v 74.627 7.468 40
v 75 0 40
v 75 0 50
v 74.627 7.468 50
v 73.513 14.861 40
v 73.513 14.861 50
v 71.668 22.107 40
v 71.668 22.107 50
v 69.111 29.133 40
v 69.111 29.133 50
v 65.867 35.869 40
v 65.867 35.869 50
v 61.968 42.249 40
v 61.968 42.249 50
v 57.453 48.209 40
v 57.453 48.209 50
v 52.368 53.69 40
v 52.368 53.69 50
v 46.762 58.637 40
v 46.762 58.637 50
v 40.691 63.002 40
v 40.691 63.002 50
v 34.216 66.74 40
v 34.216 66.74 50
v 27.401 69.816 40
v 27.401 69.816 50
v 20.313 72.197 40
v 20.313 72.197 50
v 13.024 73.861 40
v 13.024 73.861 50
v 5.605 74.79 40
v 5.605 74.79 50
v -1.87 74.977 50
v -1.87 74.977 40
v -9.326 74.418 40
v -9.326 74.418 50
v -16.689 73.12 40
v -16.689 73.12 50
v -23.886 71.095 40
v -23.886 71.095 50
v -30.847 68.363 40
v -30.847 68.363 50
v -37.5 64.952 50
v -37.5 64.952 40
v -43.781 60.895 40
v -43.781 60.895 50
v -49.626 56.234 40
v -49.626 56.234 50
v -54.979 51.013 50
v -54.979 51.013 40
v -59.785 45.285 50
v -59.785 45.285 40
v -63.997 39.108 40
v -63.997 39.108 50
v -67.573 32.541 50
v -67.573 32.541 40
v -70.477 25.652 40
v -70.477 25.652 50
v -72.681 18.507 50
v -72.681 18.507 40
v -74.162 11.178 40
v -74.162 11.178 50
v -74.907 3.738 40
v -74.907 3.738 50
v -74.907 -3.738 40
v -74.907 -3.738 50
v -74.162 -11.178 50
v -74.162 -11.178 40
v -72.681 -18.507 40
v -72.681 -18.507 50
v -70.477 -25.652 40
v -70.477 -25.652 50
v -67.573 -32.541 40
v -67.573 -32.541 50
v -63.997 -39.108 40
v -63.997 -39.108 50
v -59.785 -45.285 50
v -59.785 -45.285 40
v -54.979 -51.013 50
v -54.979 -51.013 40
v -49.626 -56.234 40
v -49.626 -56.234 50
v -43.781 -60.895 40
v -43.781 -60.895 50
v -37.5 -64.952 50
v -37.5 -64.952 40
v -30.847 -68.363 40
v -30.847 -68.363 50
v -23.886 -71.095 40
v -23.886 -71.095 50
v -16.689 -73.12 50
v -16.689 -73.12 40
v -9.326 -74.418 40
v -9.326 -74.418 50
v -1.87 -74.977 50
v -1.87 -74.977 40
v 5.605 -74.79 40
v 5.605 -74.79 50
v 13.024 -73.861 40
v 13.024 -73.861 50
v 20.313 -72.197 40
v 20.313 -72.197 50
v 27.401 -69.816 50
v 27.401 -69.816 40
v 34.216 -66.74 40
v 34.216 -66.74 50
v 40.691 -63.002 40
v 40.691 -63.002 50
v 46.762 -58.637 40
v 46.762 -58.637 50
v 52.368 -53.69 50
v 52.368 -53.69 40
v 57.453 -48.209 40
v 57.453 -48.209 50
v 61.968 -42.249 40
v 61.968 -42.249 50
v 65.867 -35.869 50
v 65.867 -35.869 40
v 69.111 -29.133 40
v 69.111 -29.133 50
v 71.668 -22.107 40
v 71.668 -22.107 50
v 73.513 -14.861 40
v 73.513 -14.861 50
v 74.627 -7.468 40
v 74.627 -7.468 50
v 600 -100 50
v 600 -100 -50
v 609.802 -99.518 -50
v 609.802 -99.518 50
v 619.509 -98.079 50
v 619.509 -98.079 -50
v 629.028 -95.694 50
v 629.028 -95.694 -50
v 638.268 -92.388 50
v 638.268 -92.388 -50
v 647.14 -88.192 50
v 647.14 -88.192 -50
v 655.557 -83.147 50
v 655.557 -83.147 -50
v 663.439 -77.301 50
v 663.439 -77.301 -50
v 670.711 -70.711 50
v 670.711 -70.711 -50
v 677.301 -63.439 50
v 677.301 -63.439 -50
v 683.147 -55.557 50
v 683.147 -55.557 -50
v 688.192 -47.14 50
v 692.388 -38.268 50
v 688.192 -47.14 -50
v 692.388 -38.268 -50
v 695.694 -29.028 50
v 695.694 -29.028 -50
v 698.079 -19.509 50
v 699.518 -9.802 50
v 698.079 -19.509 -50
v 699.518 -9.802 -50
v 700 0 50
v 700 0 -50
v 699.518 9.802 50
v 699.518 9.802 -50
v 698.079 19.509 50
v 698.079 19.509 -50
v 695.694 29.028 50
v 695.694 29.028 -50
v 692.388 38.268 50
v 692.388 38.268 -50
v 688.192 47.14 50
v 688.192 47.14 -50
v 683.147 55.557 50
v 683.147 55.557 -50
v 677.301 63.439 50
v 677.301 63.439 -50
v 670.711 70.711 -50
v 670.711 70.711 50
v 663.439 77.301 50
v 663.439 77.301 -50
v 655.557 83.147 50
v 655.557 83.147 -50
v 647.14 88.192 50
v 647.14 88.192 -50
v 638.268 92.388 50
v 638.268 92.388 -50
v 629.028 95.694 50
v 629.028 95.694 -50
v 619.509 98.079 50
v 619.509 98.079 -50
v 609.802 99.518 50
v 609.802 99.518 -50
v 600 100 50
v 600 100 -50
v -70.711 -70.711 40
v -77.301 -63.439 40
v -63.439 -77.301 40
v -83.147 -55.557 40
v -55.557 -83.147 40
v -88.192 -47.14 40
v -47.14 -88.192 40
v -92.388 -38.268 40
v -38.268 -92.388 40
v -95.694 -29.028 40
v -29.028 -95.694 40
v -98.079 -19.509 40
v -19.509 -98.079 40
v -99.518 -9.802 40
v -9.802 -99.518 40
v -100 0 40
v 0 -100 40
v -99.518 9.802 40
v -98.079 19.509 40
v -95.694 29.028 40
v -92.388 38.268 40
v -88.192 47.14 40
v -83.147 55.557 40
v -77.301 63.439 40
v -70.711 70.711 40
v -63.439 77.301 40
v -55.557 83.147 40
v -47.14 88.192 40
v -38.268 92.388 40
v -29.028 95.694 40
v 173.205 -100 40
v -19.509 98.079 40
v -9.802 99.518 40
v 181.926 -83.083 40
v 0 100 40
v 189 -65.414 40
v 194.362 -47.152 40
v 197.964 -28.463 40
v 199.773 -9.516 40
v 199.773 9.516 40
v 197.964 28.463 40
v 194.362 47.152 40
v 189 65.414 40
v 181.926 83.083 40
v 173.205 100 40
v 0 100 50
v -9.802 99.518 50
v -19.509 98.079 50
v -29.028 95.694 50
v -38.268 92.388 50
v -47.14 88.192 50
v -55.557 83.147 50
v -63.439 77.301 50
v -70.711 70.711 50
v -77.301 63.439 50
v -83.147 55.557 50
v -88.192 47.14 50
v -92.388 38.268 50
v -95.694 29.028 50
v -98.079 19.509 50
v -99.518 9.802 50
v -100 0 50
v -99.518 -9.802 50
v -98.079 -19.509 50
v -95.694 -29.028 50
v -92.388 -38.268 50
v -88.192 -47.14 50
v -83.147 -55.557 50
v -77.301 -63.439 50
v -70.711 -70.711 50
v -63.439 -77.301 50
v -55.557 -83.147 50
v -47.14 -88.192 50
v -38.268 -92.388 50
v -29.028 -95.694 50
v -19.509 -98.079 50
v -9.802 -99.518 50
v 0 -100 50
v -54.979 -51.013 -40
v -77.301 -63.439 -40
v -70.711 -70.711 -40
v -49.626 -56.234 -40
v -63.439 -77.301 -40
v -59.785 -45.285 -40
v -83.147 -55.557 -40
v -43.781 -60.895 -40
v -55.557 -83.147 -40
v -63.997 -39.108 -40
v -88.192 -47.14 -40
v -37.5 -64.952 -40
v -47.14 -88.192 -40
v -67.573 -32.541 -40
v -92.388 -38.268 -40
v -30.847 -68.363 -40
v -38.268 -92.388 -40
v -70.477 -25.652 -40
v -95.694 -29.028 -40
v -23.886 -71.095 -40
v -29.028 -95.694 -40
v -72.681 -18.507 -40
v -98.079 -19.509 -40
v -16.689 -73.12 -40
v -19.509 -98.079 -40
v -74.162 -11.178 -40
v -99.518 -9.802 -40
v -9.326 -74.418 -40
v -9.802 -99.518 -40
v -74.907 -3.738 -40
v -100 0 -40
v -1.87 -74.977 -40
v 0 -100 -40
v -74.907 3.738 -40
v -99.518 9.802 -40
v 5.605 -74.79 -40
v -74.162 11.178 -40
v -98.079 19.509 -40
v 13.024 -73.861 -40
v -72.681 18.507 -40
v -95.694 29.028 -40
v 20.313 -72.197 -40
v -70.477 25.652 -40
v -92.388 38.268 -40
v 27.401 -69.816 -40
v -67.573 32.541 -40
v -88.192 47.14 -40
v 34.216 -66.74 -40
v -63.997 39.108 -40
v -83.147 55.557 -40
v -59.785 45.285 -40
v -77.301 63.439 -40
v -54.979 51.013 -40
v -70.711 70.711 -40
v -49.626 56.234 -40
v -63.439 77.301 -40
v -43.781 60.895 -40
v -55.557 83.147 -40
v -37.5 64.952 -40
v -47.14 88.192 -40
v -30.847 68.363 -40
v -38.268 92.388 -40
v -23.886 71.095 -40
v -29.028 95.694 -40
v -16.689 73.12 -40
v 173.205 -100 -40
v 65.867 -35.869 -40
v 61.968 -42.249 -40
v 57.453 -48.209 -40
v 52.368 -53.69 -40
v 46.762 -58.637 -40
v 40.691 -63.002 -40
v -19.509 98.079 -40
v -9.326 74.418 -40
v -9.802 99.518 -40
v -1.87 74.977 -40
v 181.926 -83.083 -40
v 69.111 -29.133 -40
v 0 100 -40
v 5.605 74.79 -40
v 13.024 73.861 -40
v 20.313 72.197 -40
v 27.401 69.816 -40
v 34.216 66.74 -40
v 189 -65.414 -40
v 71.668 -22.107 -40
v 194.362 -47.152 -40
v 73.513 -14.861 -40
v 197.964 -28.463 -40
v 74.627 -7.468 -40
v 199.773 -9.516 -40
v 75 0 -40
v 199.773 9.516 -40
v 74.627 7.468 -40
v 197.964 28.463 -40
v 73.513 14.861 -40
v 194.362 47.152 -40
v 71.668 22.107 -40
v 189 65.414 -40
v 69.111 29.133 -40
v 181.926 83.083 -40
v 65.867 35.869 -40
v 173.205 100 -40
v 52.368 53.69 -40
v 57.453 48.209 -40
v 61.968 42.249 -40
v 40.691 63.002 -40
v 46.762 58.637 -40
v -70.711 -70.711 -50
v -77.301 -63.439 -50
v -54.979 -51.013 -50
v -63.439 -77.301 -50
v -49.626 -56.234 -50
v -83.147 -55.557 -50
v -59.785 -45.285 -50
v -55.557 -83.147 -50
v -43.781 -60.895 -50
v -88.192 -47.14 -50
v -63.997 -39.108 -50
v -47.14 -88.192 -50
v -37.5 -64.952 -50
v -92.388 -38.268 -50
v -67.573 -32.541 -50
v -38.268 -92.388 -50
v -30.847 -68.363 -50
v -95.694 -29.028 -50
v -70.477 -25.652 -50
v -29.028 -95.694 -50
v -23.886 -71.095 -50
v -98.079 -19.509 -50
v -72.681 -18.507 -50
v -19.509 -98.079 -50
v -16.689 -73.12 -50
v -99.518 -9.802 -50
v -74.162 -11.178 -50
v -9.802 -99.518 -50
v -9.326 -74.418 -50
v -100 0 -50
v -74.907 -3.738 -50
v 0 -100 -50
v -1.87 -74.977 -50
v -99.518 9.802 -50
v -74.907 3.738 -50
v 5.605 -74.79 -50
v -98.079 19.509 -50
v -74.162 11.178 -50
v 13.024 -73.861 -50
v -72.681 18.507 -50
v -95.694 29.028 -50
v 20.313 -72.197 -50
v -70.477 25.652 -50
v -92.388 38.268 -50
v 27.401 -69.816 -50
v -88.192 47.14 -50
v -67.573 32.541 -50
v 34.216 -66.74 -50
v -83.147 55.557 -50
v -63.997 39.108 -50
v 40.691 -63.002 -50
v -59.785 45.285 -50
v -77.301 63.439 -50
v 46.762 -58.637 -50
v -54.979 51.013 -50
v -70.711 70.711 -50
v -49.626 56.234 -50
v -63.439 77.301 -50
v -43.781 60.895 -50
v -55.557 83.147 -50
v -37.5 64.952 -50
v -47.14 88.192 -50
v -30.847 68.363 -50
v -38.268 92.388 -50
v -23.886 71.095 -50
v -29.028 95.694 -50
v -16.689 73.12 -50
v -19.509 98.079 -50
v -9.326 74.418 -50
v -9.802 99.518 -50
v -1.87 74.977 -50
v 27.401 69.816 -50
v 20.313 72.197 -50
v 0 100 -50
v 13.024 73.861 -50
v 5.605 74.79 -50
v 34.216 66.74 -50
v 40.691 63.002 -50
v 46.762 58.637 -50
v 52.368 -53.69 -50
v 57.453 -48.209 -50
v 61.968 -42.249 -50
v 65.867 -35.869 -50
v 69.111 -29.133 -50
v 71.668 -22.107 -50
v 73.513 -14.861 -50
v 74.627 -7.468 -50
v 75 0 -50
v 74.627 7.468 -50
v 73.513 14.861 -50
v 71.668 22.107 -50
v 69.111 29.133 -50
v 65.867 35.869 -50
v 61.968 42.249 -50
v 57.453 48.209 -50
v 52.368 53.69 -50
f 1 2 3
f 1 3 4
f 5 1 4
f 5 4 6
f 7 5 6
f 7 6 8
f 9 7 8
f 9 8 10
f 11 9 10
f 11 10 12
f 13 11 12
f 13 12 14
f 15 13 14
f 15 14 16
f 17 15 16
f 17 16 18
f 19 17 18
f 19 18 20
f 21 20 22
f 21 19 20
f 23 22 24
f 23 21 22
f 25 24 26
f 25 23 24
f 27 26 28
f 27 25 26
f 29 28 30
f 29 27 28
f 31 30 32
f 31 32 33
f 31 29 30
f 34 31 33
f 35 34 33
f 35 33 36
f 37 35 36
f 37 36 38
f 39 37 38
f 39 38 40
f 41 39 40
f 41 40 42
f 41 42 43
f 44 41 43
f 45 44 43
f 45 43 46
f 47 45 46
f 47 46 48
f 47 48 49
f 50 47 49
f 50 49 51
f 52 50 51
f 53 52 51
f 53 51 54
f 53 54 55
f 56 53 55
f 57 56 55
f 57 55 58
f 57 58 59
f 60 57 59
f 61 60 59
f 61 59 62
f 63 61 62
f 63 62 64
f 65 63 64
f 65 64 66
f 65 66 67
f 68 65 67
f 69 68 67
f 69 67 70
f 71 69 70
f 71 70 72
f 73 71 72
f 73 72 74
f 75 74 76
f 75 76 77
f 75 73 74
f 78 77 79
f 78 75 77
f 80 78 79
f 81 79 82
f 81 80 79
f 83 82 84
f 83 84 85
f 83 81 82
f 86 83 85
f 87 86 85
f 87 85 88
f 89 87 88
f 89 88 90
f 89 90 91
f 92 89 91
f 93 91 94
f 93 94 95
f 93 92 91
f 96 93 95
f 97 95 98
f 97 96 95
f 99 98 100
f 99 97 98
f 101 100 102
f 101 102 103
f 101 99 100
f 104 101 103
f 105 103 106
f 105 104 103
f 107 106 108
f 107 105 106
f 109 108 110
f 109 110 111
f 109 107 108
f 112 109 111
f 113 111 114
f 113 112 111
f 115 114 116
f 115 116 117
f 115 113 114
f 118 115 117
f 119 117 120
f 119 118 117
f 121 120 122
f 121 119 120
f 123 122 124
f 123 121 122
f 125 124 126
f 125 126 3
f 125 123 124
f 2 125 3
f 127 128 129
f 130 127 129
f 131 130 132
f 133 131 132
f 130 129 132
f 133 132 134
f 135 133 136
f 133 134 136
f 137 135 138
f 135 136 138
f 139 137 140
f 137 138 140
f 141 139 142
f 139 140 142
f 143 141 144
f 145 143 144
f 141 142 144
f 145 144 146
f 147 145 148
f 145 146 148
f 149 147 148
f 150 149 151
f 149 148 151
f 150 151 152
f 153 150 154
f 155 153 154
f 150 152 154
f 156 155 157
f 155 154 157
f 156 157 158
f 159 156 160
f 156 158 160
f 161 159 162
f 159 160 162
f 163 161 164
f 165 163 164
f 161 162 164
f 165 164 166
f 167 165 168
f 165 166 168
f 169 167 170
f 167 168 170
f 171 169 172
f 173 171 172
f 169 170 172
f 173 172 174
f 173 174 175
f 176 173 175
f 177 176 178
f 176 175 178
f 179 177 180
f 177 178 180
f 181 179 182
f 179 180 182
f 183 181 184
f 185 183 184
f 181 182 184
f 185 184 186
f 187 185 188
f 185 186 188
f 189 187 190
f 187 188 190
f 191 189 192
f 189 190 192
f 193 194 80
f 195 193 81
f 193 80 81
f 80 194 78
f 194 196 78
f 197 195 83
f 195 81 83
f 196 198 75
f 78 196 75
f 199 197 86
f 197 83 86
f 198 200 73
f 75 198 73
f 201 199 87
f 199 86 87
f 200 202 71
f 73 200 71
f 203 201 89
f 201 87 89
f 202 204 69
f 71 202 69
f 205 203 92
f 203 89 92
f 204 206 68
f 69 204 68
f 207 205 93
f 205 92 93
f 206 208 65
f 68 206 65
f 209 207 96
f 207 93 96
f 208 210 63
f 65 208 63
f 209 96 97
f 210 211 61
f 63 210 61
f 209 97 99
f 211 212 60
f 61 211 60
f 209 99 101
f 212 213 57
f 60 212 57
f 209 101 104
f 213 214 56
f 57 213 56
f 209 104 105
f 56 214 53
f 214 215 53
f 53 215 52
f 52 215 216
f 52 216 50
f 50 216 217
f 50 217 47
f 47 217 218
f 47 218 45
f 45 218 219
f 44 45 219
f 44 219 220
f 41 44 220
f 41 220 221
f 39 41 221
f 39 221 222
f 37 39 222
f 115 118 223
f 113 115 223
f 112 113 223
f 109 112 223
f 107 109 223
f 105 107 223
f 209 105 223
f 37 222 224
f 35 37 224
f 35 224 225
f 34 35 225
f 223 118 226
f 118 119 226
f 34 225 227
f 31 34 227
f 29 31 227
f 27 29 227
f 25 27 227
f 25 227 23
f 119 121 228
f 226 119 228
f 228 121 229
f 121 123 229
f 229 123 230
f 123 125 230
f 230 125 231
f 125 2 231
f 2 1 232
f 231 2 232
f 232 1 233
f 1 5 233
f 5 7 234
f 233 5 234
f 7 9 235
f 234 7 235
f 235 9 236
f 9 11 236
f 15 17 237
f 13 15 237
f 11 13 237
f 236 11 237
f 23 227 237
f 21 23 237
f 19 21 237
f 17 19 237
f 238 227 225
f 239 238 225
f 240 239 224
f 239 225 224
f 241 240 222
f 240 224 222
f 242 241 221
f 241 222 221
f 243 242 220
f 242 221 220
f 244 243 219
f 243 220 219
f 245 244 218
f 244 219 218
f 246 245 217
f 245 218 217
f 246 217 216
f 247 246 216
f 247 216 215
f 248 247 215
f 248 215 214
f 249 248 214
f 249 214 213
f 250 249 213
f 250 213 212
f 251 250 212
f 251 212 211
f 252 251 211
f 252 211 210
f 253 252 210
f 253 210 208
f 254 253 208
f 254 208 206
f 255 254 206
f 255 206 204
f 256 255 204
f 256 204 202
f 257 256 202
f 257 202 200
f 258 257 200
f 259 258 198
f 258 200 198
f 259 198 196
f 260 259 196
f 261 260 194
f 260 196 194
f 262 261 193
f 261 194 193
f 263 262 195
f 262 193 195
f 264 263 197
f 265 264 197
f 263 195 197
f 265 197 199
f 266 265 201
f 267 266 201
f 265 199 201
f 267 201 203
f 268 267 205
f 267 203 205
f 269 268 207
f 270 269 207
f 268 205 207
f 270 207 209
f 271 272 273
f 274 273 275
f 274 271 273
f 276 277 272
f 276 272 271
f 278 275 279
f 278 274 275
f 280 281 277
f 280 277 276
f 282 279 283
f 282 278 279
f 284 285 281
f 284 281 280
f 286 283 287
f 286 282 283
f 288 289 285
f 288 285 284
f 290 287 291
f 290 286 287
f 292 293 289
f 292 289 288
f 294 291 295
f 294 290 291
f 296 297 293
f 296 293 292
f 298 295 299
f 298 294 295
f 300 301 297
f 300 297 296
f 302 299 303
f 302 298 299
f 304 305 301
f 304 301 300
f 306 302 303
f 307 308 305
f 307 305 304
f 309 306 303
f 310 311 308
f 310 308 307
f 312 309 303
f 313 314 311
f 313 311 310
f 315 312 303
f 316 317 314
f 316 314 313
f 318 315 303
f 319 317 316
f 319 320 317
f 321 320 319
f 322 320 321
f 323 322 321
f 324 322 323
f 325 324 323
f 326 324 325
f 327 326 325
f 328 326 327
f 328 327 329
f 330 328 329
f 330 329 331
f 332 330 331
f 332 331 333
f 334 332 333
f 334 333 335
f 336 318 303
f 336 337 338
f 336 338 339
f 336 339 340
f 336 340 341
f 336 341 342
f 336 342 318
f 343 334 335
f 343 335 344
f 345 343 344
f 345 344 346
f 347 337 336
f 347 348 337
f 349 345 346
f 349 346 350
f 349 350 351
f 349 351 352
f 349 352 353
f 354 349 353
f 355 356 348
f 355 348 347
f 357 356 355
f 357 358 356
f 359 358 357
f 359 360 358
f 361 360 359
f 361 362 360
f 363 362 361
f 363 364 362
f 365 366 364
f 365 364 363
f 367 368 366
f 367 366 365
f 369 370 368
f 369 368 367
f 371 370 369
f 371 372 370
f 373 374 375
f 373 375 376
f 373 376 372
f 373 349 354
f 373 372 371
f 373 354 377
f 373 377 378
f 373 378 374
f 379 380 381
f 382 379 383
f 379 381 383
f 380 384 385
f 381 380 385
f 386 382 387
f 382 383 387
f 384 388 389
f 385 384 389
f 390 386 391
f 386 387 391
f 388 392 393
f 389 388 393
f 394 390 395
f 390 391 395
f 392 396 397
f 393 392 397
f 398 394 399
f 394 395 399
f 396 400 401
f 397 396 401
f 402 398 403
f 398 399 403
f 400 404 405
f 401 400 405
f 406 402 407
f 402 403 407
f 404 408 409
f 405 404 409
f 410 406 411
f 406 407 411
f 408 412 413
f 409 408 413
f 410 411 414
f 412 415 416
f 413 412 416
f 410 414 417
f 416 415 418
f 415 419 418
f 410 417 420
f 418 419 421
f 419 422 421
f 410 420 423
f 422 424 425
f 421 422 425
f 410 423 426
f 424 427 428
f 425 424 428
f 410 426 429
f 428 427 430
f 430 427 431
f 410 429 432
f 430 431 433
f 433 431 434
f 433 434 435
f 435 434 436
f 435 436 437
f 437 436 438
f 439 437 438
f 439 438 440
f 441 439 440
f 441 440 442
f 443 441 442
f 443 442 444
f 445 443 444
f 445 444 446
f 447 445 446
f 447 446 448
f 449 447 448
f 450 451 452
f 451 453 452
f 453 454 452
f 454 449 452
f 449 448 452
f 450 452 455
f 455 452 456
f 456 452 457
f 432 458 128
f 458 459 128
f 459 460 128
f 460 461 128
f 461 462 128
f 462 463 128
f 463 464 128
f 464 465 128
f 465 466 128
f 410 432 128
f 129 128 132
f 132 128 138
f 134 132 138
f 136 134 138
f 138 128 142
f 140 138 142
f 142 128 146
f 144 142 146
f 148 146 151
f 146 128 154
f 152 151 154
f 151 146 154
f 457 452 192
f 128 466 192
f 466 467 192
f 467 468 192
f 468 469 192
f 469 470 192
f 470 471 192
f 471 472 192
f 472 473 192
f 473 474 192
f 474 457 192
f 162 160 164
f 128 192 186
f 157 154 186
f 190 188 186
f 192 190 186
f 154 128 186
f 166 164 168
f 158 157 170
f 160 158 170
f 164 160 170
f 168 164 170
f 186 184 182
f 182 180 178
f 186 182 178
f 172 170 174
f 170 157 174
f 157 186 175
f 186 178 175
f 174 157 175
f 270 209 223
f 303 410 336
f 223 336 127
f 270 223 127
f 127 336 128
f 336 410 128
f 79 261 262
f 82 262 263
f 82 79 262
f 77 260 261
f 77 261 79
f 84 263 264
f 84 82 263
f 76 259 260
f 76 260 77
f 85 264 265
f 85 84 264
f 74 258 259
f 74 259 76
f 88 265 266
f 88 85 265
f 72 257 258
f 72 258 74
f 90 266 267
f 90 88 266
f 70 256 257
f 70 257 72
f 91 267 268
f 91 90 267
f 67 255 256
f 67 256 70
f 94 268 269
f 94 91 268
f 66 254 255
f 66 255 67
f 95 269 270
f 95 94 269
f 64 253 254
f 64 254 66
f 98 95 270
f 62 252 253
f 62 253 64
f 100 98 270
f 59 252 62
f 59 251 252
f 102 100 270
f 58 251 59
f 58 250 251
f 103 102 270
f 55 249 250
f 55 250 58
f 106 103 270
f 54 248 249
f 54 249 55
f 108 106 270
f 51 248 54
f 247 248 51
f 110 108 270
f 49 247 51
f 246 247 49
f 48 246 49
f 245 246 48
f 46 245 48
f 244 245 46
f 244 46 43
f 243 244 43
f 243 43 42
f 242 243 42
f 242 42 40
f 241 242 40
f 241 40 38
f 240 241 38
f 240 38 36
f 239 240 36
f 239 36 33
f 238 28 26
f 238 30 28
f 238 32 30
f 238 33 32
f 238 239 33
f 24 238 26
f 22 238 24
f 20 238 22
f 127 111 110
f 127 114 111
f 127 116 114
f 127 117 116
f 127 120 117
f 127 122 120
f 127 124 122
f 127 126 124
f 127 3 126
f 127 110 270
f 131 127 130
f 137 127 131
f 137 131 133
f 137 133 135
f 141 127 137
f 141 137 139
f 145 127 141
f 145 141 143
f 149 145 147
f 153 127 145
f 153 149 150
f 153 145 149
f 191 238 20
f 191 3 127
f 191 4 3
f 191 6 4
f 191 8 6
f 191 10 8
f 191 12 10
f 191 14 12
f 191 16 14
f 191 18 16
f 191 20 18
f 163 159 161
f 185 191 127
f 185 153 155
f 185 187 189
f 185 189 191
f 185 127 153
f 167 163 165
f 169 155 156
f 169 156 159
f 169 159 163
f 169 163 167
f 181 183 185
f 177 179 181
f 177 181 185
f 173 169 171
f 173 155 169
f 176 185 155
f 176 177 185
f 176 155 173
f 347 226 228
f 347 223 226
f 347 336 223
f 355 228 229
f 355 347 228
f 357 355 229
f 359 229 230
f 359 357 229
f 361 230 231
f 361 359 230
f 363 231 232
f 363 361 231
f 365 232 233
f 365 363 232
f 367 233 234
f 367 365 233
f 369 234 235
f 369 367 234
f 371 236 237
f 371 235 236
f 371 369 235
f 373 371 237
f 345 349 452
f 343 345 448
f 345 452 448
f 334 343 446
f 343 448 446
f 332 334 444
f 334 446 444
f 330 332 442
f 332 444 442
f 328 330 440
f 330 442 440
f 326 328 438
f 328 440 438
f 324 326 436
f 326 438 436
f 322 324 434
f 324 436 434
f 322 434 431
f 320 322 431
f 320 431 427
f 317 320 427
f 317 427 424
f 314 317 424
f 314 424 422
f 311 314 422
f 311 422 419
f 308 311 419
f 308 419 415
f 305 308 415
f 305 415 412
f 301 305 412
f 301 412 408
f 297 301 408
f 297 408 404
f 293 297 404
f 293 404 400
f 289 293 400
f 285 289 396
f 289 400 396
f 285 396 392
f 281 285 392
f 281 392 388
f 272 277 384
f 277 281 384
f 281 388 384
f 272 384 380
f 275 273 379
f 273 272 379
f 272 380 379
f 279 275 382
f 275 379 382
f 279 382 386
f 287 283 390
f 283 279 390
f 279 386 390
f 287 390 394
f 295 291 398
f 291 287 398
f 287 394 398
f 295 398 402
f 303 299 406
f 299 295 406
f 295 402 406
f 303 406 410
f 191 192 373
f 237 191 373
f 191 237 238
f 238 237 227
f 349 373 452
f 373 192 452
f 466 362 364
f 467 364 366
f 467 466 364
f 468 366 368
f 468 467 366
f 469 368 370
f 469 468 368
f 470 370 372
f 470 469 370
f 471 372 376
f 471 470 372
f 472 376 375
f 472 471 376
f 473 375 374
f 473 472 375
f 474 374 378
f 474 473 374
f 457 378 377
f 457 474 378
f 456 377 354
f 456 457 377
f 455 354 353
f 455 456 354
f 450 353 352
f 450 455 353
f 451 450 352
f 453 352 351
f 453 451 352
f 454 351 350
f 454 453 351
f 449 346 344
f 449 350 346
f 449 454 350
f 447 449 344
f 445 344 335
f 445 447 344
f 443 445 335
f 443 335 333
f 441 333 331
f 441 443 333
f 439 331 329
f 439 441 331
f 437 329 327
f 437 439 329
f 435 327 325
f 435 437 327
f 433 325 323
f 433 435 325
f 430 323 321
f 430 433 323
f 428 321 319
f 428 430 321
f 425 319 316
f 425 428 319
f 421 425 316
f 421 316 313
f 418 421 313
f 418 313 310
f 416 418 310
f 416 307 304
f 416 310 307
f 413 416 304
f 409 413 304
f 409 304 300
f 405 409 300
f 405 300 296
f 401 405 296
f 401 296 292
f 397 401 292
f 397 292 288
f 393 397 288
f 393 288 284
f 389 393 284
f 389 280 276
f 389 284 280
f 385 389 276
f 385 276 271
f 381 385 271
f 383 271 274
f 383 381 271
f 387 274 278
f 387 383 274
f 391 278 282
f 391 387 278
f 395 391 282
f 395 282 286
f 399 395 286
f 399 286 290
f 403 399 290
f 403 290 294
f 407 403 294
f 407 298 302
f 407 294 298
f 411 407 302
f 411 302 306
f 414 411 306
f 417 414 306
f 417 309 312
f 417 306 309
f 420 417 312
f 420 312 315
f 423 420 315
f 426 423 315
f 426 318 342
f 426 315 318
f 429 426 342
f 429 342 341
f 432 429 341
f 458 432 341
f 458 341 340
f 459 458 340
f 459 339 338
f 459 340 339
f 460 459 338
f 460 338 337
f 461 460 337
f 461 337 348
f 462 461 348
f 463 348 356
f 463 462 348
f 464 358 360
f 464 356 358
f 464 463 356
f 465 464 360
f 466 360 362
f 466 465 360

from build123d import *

# Parameters (mm, degrees)
BOSS_EXTRUDE1_DEPTH      = 50
BOSS_EXTRUDE1_DEPTH_BACK = 50
CUT_EXTRUDE1_DEPTH       = 50
CUT_EXTRUDE1_DEPTH_BACK  = 50
SKETCH3_R                = 75
CUT_EXTRUDE2_DEPTH       = 40
CUT_EXTRUDE2_DEPTH_BACK  = 40
SKETCH4_R                = 200


with BuildPart() as part:
    # Sketch2 → Boss-Extrude1 (new, two sides: drawn at the far end of the back side and taken through both)
    with BuildSketch(Plane.XY.offset(-BOSS_EXTRUDE1_DEPTH_BACK)):
        with BuildLine():
            Line((600, 100), (0, 100))
            ThreePointArc((0, 100), (-100, 0), (0, -100))
            Line((0, -100), (600, -100))
            ThreePointArc((600, -100), (700, 0), (600, 100))
        make_face()
    extrude(amount=BOSS_EXTRUDE1_DEPTH + BOSS_EXTRUDE1_DEPTH_BACK)

    # Sketch3 → Cut-Extrude1 (cut, two sides: drawn at the far end of the back side and taken through both)
    with BuildSketch(Plane.XY.offset(-CUT_EXTRUDE1_DEPTH_BACK)):
        Circle(SKETCH3_R)
    extrude(amount=CUT_EXTRUDE1_DEPTH + CUT_EXTRUDE1_DEPTH_BACK, mode=Mode.SUBTRACT)

    # Sketch4 → Cut-Extrude2 (cut, two sides: drawn at the far end of the back side and taken through both)
    with BuildSketch(Plane.XY.offset(-CUT_EXTRUDE2_DEPTH_BACK)):
        Circle(SKETCH4_R)
    extrude(amount=CUT_EXTRUDE2_DEPTH + CUT_EXTRUDE2_DEPTH_BACK, mode=Mode.SUBTRACT)


solid = part.part
